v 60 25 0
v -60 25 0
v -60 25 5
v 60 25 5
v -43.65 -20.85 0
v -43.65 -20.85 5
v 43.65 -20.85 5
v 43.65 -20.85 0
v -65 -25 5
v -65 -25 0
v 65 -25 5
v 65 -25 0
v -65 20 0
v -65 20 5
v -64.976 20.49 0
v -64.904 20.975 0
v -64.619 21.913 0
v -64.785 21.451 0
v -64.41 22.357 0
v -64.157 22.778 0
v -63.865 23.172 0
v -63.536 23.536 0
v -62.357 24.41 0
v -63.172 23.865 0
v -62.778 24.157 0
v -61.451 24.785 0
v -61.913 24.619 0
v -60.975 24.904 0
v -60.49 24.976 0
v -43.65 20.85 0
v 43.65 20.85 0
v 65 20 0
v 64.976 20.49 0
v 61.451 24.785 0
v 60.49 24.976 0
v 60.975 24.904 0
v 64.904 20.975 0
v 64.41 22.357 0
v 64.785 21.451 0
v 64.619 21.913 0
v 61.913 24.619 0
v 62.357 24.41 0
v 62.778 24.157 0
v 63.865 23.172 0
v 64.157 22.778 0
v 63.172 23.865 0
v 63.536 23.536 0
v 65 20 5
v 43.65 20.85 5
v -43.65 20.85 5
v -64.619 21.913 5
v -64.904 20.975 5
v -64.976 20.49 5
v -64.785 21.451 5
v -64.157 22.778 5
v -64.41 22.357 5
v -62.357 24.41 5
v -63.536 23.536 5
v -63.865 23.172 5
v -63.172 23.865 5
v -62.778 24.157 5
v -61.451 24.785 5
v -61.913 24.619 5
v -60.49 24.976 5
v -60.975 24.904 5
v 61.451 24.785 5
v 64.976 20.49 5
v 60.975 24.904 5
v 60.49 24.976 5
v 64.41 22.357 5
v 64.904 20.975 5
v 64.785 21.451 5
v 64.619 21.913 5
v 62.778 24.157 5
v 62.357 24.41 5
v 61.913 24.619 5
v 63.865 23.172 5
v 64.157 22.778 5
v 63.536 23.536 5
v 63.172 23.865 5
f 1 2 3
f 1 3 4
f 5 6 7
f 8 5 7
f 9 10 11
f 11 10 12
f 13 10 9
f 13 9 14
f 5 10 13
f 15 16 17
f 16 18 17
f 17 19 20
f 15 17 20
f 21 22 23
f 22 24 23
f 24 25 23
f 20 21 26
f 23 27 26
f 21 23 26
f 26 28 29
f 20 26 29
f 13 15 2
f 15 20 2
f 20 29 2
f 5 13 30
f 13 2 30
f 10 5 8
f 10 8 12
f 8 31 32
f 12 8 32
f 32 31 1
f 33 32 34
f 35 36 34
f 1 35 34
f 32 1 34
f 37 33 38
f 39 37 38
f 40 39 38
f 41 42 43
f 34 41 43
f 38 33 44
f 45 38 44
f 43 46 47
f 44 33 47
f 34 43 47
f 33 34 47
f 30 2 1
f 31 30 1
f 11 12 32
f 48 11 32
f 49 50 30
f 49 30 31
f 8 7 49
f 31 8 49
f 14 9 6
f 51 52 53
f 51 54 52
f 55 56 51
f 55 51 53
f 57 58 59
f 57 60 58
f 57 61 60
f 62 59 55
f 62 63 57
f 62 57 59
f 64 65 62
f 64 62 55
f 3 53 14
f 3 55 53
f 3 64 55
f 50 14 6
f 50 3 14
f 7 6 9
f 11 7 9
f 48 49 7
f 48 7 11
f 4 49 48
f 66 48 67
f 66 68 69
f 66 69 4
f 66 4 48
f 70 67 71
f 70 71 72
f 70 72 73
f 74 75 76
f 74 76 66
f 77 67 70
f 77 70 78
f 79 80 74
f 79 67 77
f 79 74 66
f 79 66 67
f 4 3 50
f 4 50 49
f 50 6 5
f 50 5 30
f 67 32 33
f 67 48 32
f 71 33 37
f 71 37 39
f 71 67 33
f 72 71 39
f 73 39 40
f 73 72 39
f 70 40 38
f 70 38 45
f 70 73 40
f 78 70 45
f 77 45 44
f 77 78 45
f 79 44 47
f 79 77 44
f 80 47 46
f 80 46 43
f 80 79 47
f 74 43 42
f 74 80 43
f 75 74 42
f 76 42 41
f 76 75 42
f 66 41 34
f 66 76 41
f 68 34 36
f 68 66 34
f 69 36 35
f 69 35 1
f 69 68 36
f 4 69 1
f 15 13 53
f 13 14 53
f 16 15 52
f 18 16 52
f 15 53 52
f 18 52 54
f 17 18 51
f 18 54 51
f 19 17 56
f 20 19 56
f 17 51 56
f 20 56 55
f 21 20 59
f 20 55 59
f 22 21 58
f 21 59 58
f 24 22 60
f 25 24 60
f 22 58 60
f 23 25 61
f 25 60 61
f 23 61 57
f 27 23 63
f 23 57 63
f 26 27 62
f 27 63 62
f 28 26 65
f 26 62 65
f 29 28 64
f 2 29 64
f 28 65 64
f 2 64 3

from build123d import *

# Parameters (mm, degrees)
SKETCH1_W           = 130
SKETCH1_H           = 50
BOSS_EXTRUDE1_DEPTH = 5
FILLET1_R           = 5
SKETCH2_W           = 87.3
SKETCH2_H           = 41.7
CUT_EXTRUDE1_DEPTH  = 5


with BuildPart() as part:
    # Sketch1 → Boss-Extrude1 (new body)
    with BuildSketch(Plane.XY):
        Rectangle(SKETCH1_W, SKETCH1_H)
    extrude(amount=BOSS_EXTRUDE1_DEPTH)

    # Fillet1
    fillet1_edges = [part.edges().sort_by_distance(p)[0] for p in [
        (-65, 25, 2.5),
        (65, 25, 2.5),
    ]]
    fillet(fillet1_edges, radius=FILLET1_R)

    # Sketch2 → Cut-Extrude1 (cut)
    with BuildSketch(Plane.XY.offset(5)):
        Rectangle(SKETCH2_W, SKETCH2_H)
    extrude(amount=-CUT_EXTRUDE1_DEPTH, mode=Mode.SUBTRACT)


solid = part.part
